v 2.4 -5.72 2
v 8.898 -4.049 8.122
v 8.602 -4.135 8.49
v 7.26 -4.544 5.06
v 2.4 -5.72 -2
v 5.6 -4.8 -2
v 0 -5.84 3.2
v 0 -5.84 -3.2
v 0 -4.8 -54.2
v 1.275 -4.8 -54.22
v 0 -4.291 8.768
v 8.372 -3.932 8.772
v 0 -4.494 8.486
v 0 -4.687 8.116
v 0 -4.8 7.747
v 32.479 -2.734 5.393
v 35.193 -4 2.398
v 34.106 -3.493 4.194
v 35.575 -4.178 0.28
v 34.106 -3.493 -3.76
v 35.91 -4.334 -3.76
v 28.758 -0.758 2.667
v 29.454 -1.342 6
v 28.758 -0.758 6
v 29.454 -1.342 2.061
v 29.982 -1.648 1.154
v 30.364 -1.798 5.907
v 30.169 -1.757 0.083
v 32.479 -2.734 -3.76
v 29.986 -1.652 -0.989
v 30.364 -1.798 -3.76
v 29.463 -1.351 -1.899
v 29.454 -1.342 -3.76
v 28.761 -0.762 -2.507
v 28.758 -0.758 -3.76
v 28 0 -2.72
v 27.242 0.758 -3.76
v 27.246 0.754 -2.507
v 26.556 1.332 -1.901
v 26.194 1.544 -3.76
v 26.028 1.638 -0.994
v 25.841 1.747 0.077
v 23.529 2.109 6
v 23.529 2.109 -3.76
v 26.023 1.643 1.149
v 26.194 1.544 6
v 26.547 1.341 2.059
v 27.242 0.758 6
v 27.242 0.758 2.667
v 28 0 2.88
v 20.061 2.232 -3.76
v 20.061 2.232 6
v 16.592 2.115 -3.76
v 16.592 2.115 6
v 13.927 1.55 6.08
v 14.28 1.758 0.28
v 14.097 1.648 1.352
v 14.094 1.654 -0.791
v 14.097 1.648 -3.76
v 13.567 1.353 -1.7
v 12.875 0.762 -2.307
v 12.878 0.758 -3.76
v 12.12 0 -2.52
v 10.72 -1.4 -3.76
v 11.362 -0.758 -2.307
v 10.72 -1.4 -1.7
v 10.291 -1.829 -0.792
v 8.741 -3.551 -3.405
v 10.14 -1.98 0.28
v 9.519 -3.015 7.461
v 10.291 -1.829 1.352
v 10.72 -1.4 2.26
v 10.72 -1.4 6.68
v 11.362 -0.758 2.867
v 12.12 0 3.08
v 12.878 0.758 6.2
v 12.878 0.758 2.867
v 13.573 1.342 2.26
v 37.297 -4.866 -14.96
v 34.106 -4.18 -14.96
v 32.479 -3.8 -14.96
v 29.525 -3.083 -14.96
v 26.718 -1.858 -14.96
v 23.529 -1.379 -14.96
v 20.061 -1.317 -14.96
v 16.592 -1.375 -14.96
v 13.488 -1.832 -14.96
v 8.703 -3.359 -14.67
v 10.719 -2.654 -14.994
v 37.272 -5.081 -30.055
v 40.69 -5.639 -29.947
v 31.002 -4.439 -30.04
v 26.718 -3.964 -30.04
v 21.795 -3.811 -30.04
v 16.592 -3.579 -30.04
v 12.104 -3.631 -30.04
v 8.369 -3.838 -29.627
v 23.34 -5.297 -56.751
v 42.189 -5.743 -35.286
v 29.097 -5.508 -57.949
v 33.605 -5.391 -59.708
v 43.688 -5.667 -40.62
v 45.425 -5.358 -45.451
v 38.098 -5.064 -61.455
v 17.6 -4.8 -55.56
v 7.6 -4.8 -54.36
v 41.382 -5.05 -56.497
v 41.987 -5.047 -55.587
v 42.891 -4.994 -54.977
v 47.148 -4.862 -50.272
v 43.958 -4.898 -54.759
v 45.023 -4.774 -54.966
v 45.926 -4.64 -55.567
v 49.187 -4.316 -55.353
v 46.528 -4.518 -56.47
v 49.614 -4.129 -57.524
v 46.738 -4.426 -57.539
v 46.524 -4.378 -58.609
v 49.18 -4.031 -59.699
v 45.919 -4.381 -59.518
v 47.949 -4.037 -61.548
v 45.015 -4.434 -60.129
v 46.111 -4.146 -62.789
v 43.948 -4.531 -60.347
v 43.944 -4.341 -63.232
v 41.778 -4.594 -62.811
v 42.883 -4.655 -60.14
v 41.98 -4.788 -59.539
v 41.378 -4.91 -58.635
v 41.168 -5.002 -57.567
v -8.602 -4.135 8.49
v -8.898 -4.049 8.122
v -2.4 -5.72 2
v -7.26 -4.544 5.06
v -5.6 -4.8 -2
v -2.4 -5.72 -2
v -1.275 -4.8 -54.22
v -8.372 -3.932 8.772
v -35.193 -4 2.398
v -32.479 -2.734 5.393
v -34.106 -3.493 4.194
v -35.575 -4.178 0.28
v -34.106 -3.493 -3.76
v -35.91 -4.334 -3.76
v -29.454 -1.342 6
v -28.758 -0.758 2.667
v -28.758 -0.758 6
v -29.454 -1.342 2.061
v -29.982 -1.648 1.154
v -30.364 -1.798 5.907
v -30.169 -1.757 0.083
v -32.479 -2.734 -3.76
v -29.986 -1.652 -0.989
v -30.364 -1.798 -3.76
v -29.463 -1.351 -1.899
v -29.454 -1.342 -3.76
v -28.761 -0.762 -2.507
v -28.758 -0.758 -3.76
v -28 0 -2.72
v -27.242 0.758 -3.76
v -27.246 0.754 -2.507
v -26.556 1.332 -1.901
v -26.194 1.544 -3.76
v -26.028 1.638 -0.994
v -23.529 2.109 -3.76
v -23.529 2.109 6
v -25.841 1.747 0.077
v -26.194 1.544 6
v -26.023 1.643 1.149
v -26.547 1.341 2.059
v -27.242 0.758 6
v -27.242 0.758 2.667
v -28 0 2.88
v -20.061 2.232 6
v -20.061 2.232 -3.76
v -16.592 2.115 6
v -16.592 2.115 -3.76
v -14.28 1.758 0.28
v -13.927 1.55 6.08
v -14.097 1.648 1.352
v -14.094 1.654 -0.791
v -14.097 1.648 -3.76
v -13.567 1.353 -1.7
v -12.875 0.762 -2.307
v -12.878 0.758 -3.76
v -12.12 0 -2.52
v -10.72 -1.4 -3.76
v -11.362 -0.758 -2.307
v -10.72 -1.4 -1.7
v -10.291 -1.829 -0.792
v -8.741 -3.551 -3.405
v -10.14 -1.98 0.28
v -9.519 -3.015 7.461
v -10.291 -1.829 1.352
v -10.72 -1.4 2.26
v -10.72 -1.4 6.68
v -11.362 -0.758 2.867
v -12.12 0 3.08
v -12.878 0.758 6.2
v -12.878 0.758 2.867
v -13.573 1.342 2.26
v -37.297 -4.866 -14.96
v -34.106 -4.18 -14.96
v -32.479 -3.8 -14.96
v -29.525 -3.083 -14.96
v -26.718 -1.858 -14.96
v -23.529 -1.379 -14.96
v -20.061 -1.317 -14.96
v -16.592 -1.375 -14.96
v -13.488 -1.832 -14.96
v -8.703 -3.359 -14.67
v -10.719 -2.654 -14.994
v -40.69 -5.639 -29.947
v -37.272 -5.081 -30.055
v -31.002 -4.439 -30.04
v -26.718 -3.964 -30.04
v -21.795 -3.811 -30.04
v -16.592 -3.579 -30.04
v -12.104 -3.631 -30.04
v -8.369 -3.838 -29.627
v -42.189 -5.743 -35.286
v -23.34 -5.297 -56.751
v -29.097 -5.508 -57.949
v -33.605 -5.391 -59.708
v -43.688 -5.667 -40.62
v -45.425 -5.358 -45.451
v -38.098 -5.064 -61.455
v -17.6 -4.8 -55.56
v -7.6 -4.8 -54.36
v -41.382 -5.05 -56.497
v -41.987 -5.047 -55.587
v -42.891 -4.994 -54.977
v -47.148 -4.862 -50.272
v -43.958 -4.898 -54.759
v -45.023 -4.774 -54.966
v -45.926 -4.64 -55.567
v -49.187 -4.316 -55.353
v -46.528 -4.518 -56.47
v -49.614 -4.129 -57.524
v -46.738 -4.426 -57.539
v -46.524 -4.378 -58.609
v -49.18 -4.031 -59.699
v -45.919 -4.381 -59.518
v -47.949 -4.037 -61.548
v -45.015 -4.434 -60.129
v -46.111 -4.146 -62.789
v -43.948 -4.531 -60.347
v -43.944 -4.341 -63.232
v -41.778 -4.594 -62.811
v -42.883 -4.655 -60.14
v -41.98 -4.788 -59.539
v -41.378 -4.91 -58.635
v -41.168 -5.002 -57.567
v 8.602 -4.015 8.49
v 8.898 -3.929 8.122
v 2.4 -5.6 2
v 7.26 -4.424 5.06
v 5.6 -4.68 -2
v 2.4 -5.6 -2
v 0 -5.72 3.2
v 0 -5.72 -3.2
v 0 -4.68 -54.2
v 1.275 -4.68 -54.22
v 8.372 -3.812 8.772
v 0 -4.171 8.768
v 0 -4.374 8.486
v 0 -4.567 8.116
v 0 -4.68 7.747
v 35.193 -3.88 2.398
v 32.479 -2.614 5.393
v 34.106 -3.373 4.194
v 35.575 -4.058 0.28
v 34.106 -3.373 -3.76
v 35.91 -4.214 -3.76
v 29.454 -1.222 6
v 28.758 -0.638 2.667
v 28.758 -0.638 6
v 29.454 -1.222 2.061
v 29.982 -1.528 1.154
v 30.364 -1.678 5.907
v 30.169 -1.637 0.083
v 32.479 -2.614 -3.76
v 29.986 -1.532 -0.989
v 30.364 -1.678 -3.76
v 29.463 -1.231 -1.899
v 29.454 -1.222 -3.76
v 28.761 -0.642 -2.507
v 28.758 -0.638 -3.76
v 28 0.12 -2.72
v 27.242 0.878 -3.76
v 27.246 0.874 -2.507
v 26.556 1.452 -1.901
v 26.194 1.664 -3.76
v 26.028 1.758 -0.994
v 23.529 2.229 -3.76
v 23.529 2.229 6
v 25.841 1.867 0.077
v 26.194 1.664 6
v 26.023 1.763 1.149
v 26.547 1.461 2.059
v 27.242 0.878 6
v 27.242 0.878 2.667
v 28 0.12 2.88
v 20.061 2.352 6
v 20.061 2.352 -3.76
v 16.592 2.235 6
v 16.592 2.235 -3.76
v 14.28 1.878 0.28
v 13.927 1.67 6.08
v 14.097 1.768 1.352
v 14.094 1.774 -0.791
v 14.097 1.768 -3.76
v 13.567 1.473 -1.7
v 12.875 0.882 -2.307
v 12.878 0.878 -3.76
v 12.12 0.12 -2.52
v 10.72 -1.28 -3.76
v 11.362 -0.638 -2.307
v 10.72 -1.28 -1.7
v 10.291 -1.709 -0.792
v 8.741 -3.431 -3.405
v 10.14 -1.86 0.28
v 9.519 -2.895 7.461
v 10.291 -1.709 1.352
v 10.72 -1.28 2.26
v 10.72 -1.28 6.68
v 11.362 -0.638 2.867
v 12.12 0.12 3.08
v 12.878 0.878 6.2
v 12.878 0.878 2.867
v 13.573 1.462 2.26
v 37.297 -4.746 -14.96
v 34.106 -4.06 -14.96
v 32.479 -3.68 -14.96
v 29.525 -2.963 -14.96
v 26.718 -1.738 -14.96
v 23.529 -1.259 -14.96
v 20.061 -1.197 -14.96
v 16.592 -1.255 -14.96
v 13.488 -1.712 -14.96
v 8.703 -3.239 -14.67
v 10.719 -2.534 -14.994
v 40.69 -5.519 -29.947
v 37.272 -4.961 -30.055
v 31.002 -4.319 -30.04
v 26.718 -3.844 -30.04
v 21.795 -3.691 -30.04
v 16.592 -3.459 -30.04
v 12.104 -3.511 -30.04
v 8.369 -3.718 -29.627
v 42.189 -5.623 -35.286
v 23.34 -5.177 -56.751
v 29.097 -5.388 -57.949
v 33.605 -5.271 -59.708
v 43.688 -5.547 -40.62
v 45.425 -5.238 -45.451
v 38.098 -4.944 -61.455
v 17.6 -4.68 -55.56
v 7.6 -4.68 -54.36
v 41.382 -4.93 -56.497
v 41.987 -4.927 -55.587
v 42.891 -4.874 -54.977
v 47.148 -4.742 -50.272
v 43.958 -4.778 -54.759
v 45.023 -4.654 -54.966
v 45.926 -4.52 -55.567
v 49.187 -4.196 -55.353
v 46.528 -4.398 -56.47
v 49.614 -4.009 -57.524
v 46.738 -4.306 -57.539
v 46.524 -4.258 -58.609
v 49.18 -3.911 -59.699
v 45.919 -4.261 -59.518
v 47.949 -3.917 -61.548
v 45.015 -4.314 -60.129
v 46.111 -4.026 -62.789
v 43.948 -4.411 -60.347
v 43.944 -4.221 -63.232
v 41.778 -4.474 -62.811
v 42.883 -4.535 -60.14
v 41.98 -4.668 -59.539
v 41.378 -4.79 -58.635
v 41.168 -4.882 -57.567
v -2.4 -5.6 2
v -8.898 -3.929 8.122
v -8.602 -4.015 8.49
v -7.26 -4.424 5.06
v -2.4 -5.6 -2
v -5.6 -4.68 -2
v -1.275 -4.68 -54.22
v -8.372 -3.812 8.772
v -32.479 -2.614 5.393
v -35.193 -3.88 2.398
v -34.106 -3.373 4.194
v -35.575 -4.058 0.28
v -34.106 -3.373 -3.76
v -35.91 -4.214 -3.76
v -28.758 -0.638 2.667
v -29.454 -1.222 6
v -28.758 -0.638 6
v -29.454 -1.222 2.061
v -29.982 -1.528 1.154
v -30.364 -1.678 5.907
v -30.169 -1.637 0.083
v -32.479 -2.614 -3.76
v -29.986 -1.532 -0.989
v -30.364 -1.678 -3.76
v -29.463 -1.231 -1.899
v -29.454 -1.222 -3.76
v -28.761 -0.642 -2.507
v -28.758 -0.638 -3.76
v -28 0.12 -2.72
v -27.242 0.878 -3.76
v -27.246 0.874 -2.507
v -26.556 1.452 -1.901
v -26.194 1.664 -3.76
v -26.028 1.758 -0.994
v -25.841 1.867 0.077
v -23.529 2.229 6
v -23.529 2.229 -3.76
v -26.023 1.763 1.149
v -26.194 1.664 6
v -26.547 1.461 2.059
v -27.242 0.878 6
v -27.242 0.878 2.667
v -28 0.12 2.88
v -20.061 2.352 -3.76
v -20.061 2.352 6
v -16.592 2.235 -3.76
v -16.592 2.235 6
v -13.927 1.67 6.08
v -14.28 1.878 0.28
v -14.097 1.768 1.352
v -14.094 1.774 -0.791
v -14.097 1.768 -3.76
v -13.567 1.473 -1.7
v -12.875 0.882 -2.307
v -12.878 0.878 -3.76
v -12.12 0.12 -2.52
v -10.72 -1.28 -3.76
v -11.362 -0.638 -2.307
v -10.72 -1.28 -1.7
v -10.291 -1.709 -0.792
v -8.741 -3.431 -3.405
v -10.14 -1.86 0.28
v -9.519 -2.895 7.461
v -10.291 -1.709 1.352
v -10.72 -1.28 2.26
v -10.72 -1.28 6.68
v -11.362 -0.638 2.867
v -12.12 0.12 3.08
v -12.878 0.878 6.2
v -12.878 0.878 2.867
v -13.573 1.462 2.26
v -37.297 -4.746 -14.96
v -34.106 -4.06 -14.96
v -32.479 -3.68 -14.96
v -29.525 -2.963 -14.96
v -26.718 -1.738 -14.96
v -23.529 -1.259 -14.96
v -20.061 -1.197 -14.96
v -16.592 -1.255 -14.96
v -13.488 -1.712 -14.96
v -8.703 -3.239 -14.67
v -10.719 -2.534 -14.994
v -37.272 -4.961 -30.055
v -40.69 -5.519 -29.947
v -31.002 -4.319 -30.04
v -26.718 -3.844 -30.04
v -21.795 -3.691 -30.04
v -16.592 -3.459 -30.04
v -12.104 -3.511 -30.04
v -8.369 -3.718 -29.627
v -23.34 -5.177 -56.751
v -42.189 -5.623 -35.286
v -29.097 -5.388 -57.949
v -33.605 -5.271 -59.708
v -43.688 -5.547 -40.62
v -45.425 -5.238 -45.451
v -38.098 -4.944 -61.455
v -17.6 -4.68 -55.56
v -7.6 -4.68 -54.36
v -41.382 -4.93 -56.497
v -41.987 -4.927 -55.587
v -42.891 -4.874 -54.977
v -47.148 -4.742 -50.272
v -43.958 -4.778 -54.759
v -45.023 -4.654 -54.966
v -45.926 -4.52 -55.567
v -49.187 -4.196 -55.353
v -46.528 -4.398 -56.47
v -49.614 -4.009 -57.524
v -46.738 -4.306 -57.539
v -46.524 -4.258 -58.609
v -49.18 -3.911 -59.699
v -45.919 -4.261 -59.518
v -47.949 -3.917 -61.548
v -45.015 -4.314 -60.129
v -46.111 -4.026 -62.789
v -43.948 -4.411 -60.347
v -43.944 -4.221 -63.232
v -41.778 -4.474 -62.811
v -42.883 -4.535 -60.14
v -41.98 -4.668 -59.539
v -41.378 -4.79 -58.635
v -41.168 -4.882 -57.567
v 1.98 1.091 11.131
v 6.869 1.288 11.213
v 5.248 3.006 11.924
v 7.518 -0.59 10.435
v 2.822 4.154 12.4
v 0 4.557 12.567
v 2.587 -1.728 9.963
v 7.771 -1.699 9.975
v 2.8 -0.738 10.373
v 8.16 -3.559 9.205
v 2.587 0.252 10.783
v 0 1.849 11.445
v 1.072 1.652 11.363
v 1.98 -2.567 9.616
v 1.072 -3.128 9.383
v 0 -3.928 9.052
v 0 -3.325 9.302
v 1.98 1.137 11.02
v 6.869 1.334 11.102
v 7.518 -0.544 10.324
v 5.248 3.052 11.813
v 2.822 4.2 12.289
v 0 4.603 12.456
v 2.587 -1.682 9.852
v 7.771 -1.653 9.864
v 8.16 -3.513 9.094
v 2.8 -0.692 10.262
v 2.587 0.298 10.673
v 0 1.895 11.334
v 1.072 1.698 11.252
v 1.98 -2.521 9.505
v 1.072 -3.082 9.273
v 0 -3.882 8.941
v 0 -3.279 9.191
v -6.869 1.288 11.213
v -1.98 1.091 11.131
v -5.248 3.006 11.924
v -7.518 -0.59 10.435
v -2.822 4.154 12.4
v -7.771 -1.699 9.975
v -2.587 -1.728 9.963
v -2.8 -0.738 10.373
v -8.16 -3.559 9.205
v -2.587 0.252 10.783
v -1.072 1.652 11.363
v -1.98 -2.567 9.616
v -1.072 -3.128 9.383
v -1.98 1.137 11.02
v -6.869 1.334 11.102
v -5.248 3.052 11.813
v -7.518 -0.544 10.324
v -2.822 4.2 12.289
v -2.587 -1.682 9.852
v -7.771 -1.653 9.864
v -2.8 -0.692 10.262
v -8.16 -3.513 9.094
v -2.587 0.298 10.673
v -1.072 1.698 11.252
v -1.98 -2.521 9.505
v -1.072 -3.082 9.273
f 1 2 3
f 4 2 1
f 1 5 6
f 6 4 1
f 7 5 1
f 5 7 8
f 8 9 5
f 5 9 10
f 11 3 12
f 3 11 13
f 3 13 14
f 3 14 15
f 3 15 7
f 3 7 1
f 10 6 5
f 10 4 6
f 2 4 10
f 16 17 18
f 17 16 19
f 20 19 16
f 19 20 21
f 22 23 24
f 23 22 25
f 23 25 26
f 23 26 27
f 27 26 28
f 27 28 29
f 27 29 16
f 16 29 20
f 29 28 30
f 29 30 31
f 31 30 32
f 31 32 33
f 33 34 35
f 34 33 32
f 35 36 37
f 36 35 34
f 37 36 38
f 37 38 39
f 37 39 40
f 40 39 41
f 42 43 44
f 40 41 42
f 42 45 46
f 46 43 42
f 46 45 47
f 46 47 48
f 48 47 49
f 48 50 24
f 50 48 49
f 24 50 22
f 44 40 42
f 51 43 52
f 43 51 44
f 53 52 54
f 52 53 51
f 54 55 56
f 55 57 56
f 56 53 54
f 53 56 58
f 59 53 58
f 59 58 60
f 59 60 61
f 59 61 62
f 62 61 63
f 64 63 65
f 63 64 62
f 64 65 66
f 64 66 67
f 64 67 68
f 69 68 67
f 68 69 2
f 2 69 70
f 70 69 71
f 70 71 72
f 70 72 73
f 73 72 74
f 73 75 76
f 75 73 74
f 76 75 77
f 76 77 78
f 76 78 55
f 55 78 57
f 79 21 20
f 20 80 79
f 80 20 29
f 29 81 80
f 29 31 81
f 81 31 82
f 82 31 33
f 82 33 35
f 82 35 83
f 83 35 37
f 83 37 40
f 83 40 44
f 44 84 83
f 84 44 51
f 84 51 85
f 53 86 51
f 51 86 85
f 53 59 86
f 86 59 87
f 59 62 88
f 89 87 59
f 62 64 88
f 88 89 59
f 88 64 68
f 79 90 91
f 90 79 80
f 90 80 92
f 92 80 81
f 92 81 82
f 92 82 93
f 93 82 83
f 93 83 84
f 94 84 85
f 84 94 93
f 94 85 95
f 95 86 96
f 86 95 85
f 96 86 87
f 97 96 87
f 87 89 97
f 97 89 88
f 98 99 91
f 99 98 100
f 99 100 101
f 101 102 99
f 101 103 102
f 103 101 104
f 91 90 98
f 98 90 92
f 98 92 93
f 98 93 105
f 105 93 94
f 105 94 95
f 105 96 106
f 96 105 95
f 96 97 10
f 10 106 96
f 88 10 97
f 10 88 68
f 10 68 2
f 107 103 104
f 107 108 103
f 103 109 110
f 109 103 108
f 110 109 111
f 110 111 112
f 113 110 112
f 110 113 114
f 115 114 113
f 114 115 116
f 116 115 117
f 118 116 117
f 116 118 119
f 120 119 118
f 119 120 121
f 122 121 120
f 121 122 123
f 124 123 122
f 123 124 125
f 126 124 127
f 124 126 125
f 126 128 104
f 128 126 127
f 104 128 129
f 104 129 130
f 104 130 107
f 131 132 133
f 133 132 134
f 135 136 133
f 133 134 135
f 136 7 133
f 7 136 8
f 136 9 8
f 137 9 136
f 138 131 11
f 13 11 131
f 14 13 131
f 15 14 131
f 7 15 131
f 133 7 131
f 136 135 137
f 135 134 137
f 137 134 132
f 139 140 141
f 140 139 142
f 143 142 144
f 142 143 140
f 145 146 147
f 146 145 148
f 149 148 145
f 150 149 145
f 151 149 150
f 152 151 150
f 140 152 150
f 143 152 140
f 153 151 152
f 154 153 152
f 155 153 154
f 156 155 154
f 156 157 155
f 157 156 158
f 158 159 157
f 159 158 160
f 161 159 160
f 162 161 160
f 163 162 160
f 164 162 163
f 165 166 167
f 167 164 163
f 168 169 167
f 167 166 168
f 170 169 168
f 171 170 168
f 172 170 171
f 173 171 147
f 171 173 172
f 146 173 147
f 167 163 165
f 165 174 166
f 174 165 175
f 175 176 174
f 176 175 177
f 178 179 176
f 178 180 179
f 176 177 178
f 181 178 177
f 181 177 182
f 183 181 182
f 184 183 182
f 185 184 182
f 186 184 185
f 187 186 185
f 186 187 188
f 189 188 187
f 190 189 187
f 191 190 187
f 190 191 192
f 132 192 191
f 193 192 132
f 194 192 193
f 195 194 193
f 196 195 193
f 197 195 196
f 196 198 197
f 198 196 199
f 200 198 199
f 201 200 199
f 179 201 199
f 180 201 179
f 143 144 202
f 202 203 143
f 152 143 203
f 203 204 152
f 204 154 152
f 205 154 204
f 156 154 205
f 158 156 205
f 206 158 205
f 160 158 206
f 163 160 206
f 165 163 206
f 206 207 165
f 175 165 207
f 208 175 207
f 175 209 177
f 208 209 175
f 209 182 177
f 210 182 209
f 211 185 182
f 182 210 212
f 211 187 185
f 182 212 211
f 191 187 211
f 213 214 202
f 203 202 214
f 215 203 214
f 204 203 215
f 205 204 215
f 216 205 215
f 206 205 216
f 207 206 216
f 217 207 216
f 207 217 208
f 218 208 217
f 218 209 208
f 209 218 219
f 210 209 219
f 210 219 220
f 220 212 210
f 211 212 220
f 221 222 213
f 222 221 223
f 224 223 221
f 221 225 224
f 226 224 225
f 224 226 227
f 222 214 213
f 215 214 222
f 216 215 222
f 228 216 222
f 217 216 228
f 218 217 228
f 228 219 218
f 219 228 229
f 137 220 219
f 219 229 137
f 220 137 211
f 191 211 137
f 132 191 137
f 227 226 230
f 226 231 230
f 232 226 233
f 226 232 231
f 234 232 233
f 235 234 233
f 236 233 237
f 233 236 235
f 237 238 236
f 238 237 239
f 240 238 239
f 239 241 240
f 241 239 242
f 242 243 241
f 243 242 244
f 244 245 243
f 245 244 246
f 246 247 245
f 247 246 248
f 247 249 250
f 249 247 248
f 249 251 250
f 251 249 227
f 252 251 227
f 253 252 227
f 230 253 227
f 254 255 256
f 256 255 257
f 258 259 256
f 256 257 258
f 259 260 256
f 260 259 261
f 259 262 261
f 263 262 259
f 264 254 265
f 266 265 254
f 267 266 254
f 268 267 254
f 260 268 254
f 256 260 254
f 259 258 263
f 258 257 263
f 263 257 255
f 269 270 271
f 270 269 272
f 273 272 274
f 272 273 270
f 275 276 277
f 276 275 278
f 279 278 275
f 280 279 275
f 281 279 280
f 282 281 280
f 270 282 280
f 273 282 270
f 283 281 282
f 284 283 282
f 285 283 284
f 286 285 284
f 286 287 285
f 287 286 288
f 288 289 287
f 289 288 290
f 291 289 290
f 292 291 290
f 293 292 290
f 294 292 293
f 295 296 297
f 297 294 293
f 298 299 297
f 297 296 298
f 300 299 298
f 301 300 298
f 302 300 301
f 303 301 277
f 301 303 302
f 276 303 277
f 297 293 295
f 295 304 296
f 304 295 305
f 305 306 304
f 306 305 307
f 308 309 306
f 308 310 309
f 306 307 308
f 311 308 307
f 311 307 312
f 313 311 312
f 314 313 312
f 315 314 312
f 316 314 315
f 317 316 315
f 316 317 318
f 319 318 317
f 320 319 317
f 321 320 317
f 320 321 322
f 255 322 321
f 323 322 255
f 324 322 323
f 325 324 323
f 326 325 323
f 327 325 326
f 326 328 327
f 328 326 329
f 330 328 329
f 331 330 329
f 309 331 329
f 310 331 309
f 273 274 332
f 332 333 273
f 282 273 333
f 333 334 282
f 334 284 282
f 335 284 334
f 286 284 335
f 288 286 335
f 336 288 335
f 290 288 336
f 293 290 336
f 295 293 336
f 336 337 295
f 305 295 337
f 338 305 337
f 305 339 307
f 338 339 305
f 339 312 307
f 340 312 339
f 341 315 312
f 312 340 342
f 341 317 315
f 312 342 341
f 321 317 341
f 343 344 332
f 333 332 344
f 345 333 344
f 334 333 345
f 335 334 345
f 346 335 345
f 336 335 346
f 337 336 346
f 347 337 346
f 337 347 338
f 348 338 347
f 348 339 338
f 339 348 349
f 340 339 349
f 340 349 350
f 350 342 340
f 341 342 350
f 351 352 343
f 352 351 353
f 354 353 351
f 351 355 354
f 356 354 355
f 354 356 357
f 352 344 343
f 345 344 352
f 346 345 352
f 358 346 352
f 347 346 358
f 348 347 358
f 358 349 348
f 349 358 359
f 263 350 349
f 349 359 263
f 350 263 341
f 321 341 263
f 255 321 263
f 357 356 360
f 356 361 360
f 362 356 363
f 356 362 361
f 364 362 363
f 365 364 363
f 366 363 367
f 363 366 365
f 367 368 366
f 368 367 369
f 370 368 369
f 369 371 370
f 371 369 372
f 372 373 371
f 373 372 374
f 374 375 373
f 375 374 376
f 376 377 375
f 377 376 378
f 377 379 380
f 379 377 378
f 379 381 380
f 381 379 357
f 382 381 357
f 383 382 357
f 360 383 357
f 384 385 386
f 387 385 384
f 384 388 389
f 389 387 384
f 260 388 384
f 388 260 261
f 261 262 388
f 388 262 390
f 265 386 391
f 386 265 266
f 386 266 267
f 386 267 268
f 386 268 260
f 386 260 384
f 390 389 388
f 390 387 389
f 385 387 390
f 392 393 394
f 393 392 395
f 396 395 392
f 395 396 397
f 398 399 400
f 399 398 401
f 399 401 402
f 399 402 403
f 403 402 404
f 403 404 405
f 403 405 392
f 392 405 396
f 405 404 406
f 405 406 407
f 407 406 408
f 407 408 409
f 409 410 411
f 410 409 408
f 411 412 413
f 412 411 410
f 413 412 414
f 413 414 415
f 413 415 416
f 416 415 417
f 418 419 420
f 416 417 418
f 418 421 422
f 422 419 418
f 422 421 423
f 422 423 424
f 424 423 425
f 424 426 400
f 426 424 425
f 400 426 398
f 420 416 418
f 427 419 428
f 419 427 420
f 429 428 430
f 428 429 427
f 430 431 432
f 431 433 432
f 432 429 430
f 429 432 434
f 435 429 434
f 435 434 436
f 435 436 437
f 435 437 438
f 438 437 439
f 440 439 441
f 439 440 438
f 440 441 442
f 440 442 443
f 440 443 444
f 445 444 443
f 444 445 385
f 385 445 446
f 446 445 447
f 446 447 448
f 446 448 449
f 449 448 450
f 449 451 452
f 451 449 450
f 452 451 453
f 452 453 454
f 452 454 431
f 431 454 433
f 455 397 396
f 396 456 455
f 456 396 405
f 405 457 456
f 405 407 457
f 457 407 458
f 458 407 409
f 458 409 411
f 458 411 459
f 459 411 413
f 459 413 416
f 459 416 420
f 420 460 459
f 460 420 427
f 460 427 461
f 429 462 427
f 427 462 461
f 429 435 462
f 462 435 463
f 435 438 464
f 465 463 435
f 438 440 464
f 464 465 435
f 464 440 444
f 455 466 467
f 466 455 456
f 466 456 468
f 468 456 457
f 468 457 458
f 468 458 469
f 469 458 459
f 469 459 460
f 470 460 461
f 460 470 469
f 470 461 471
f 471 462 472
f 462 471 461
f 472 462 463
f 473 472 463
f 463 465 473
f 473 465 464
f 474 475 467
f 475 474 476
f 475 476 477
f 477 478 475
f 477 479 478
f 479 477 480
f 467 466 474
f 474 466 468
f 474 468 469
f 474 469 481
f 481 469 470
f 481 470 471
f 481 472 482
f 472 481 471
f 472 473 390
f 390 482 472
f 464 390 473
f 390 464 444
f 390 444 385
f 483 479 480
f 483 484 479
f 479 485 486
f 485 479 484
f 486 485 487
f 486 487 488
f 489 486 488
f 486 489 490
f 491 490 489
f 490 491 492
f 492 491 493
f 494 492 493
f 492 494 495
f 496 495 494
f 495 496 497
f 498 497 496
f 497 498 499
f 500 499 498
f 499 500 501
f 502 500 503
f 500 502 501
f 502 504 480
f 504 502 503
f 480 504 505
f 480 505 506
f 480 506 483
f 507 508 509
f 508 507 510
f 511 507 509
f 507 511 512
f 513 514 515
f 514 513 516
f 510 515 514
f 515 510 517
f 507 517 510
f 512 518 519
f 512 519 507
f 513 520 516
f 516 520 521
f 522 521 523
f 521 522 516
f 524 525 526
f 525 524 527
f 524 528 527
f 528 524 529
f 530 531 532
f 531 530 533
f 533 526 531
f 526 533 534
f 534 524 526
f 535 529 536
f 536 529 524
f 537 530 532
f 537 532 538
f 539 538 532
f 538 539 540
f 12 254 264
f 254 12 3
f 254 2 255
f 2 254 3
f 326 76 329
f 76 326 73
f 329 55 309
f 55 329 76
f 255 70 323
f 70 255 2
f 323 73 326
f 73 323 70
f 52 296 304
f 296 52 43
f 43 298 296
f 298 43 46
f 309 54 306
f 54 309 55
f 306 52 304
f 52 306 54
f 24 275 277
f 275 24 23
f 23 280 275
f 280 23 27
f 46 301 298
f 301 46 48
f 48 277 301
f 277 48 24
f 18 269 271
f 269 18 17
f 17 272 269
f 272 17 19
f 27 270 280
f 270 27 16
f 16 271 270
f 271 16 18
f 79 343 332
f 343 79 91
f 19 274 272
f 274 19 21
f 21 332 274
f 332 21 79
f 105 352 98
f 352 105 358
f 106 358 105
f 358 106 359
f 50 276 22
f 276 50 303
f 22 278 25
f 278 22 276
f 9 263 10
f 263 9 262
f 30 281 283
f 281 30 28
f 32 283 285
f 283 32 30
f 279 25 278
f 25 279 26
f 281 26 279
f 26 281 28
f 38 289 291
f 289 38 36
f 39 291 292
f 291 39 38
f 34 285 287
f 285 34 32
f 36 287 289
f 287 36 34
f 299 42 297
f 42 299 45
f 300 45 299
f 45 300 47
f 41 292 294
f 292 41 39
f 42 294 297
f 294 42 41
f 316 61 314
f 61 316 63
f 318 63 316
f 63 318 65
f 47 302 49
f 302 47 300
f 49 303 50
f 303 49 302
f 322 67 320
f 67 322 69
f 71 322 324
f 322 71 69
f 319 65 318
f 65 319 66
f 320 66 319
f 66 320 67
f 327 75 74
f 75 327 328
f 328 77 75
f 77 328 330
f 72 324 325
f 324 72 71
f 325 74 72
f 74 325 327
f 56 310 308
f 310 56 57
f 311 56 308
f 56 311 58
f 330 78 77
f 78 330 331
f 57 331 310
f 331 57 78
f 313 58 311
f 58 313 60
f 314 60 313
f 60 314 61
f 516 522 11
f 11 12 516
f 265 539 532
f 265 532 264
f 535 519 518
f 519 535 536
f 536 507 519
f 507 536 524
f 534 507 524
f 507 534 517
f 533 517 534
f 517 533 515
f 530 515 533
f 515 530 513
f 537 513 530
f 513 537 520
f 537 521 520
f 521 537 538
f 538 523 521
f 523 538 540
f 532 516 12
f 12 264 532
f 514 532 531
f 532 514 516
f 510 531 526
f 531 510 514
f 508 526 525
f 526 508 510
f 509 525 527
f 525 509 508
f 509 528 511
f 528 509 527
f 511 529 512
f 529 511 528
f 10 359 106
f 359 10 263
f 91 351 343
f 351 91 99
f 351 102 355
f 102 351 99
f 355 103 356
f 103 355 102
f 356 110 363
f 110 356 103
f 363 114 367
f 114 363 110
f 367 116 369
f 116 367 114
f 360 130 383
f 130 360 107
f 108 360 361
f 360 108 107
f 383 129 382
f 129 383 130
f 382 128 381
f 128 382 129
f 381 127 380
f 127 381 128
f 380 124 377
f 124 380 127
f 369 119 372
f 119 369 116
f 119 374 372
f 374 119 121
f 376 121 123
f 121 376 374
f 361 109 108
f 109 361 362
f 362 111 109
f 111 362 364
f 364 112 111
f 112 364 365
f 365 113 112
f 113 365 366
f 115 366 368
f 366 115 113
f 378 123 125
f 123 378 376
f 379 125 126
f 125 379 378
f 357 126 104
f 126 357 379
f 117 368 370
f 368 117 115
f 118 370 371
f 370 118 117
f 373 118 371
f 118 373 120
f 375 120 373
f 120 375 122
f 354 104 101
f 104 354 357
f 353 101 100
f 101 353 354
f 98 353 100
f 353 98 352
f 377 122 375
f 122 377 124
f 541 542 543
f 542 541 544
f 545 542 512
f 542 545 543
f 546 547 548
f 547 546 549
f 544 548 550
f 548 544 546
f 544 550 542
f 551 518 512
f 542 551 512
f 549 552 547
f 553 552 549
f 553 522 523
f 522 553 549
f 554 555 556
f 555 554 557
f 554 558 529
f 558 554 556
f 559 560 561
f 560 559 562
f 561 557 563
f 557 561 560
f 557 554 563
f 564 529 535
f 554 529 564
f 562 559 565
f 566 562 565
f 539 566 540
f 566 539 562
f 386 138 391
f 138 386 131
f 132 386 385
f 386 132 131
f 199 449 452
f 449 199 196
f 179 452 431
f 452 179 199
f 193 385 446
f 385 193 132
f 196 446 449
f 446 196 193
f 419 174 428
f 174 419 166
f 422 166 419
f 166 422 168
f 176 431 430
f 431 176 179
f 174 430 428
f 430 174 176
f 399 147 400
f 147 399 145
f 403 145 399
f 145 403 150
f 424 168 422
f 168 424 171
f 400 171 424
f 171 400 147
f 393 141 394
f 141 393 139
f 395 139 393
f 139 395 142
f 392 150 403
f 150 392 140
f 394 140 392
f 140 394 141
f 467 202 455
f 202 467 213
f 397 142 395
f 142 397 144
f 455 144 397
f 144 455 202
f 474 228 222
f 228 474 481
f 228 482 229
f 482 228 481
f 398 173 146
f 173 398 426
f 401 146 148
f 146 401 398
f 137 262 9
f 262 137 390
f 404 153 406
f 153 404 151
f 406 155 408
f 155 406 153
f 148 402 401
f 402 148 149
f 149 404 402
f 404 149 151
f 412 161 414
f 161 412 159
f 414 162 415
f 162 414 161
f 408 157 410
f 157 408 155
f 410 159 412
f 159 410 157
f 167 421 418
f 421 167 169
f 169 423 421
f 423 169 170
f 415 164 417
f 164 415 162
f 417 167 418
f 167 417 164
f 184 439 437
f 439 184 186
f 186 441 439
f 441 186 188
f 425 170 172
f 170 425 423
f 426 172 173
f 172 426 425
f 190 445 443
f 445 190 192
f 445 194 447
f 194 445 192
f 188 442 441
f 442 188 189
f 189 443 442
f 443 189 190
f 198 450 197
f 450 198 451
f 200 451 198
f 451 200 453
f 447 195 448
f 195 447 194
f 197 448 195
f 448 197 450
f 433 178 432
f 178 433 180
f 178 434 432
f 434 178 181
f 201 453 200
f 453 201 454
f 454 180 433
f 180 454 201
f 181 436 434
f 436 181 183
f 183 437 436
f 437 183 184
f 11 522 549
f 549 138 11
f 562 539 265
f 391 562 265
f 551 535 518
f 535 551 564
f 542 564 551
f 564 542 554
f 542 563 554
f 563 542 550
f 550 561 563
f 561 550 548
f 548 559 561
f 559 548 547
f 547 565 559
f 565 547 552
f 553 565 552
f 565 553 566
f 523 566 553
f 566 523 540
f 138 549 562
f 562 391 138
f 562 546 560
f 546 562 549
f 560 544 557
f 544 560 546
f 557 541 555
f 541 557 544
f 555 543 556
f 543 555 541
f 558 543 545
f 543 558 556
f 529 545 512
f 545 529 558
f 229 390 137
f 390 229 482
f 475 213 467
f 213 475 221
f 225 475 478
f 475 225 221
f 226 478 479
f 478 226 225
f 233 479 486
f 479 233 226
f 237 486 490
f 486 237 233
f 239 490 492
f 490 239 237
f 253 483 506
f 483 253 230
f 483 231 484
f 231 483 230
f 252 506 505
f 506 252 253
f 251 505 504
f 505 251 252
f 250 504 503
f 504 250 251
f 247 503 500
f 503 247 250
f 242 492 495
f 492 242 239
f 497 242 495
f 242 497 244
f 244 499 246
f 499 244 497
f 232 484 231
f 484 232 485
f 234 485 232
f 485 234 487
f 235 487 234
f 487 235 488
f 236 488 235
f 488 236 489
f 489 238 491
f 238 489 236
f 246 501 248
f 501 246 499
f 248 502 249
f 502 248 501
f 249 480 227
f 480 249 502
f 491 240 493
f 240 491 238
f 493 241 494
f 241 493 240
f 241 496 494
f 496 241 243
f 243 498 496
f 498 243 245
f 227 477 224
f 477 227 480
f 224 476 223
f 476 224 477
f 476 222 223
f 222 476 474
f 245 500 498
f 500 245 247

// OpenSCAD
use <../lib.scad>
use <s/u767c01s01.scad>
use <s/u767c01s02.scad>
function ldraw_lib__u767c01() = [
// 0 Sail 12 x 10 Trapezoidal (Formed Shape 1)
// 0 Name: u767c01.dat
// 0 Author: Philippe Hurbain [Philo]
// 0 !LDRAW_ORG Part UPDATE 2026-07
// 0 !LICENSE Licensed under CC BY 4.0 : see CAreadme.txt
// 
// 0 !HELP Placement on mast:
// 0 !HELP 1 25 0 148 0 1 0 0 0 1 0 0 0 1 4318.dat
// 0 !HELP 1 25 0 -10 0 1 0 0 0 1 0 0 0 1 4733.dat
// 0 !HELP 1 25 -98 0 0 0 -1 0 -1 0 0 0 0 -1 3957a.dat
// 0 !HELP 1 25 98 0 0 0 1 0 -1 0 0 0 0 1 3957a.dat
// 0 !HELP 1 25 0 -18 0 -1 0 0 0 1 0 0 0 -1 3957a.dat
// 
// 0 BFC CERTIFY CCW
  [0,"BFC","CERTIFY"],
  [0,"BFC","CCW"],
// 
// 0 !CATEGORY Sheet Fabric
// 0 !KEYWORDS Set 6057
// 
// 0 !HISTORY 2026-07-30 [OrionP] Official Update 2026-07
// 
// 
// 1 16 0 0 0 1 0 0 0 1 0 0 0 1 s\u767c01s01.dat
  [1,16,0,0,0,1,0,0,0,1,0,0,0,1, ldraw_lib__s__u767c01s01()],
// 1 16 0 0 0 -1 0 0 0 1 0 0 0 1 s\u767c01s01.dat
  [1,16,0,0,0,-1,0,0,0,1,0,0,0,1, ldraw_lib__s__u767c01s01()],
// 0 BFC INVERTNEXT
  [0,"BFC","INVERTNEXT"],
// 1 16 0 0 .3 1 0 0 0 1 0 0 0 1 s\u767c01s01.dat
  [1,16,0,0,.3,1,0,0,0,1,0,0,0,1, ldraw_lib__s__u767c01s01()],
// 0 BFC INVERTNEXT
  [0,"BFC","INVERTNEXT"],
// 1 16 0 0 .3 -1 0 0 0 1 0 0 0 1 s\u767c01s01.dat
  [1,16,0,0,.3,-1,0,0,0,1,0,0,0,1, ldraw_lib__s__u767c01s01()],
// 1 16 0 0 0 1 0 0 0 1 0 0 0 1 s\u767c01s02.dat
  [1,16,0,0,0,1,0,0,0,1,0,0,0,1, ldraw_lib__s__u767c01s02()],
// 1 16 0 0 0 -1 0 0 0 1 0 0 0 1 s\u767c01s02.dat
  [1,16,0,0,0,-1,0,0,0,1,0,0,0,1, ldraw_lib__s__u767c01s02()],
];
module ldraw_lib__u767c01(step=0, col=false, unit=2/5, alt=false, line=0.2, solid=!$preview)
    makepoly(ldraw_lib__u767c01(), step=step, col=col, unit=unit, alt=alt, line=line, solid=solid);
ldraw_lib__u767c01(line=0.2);
